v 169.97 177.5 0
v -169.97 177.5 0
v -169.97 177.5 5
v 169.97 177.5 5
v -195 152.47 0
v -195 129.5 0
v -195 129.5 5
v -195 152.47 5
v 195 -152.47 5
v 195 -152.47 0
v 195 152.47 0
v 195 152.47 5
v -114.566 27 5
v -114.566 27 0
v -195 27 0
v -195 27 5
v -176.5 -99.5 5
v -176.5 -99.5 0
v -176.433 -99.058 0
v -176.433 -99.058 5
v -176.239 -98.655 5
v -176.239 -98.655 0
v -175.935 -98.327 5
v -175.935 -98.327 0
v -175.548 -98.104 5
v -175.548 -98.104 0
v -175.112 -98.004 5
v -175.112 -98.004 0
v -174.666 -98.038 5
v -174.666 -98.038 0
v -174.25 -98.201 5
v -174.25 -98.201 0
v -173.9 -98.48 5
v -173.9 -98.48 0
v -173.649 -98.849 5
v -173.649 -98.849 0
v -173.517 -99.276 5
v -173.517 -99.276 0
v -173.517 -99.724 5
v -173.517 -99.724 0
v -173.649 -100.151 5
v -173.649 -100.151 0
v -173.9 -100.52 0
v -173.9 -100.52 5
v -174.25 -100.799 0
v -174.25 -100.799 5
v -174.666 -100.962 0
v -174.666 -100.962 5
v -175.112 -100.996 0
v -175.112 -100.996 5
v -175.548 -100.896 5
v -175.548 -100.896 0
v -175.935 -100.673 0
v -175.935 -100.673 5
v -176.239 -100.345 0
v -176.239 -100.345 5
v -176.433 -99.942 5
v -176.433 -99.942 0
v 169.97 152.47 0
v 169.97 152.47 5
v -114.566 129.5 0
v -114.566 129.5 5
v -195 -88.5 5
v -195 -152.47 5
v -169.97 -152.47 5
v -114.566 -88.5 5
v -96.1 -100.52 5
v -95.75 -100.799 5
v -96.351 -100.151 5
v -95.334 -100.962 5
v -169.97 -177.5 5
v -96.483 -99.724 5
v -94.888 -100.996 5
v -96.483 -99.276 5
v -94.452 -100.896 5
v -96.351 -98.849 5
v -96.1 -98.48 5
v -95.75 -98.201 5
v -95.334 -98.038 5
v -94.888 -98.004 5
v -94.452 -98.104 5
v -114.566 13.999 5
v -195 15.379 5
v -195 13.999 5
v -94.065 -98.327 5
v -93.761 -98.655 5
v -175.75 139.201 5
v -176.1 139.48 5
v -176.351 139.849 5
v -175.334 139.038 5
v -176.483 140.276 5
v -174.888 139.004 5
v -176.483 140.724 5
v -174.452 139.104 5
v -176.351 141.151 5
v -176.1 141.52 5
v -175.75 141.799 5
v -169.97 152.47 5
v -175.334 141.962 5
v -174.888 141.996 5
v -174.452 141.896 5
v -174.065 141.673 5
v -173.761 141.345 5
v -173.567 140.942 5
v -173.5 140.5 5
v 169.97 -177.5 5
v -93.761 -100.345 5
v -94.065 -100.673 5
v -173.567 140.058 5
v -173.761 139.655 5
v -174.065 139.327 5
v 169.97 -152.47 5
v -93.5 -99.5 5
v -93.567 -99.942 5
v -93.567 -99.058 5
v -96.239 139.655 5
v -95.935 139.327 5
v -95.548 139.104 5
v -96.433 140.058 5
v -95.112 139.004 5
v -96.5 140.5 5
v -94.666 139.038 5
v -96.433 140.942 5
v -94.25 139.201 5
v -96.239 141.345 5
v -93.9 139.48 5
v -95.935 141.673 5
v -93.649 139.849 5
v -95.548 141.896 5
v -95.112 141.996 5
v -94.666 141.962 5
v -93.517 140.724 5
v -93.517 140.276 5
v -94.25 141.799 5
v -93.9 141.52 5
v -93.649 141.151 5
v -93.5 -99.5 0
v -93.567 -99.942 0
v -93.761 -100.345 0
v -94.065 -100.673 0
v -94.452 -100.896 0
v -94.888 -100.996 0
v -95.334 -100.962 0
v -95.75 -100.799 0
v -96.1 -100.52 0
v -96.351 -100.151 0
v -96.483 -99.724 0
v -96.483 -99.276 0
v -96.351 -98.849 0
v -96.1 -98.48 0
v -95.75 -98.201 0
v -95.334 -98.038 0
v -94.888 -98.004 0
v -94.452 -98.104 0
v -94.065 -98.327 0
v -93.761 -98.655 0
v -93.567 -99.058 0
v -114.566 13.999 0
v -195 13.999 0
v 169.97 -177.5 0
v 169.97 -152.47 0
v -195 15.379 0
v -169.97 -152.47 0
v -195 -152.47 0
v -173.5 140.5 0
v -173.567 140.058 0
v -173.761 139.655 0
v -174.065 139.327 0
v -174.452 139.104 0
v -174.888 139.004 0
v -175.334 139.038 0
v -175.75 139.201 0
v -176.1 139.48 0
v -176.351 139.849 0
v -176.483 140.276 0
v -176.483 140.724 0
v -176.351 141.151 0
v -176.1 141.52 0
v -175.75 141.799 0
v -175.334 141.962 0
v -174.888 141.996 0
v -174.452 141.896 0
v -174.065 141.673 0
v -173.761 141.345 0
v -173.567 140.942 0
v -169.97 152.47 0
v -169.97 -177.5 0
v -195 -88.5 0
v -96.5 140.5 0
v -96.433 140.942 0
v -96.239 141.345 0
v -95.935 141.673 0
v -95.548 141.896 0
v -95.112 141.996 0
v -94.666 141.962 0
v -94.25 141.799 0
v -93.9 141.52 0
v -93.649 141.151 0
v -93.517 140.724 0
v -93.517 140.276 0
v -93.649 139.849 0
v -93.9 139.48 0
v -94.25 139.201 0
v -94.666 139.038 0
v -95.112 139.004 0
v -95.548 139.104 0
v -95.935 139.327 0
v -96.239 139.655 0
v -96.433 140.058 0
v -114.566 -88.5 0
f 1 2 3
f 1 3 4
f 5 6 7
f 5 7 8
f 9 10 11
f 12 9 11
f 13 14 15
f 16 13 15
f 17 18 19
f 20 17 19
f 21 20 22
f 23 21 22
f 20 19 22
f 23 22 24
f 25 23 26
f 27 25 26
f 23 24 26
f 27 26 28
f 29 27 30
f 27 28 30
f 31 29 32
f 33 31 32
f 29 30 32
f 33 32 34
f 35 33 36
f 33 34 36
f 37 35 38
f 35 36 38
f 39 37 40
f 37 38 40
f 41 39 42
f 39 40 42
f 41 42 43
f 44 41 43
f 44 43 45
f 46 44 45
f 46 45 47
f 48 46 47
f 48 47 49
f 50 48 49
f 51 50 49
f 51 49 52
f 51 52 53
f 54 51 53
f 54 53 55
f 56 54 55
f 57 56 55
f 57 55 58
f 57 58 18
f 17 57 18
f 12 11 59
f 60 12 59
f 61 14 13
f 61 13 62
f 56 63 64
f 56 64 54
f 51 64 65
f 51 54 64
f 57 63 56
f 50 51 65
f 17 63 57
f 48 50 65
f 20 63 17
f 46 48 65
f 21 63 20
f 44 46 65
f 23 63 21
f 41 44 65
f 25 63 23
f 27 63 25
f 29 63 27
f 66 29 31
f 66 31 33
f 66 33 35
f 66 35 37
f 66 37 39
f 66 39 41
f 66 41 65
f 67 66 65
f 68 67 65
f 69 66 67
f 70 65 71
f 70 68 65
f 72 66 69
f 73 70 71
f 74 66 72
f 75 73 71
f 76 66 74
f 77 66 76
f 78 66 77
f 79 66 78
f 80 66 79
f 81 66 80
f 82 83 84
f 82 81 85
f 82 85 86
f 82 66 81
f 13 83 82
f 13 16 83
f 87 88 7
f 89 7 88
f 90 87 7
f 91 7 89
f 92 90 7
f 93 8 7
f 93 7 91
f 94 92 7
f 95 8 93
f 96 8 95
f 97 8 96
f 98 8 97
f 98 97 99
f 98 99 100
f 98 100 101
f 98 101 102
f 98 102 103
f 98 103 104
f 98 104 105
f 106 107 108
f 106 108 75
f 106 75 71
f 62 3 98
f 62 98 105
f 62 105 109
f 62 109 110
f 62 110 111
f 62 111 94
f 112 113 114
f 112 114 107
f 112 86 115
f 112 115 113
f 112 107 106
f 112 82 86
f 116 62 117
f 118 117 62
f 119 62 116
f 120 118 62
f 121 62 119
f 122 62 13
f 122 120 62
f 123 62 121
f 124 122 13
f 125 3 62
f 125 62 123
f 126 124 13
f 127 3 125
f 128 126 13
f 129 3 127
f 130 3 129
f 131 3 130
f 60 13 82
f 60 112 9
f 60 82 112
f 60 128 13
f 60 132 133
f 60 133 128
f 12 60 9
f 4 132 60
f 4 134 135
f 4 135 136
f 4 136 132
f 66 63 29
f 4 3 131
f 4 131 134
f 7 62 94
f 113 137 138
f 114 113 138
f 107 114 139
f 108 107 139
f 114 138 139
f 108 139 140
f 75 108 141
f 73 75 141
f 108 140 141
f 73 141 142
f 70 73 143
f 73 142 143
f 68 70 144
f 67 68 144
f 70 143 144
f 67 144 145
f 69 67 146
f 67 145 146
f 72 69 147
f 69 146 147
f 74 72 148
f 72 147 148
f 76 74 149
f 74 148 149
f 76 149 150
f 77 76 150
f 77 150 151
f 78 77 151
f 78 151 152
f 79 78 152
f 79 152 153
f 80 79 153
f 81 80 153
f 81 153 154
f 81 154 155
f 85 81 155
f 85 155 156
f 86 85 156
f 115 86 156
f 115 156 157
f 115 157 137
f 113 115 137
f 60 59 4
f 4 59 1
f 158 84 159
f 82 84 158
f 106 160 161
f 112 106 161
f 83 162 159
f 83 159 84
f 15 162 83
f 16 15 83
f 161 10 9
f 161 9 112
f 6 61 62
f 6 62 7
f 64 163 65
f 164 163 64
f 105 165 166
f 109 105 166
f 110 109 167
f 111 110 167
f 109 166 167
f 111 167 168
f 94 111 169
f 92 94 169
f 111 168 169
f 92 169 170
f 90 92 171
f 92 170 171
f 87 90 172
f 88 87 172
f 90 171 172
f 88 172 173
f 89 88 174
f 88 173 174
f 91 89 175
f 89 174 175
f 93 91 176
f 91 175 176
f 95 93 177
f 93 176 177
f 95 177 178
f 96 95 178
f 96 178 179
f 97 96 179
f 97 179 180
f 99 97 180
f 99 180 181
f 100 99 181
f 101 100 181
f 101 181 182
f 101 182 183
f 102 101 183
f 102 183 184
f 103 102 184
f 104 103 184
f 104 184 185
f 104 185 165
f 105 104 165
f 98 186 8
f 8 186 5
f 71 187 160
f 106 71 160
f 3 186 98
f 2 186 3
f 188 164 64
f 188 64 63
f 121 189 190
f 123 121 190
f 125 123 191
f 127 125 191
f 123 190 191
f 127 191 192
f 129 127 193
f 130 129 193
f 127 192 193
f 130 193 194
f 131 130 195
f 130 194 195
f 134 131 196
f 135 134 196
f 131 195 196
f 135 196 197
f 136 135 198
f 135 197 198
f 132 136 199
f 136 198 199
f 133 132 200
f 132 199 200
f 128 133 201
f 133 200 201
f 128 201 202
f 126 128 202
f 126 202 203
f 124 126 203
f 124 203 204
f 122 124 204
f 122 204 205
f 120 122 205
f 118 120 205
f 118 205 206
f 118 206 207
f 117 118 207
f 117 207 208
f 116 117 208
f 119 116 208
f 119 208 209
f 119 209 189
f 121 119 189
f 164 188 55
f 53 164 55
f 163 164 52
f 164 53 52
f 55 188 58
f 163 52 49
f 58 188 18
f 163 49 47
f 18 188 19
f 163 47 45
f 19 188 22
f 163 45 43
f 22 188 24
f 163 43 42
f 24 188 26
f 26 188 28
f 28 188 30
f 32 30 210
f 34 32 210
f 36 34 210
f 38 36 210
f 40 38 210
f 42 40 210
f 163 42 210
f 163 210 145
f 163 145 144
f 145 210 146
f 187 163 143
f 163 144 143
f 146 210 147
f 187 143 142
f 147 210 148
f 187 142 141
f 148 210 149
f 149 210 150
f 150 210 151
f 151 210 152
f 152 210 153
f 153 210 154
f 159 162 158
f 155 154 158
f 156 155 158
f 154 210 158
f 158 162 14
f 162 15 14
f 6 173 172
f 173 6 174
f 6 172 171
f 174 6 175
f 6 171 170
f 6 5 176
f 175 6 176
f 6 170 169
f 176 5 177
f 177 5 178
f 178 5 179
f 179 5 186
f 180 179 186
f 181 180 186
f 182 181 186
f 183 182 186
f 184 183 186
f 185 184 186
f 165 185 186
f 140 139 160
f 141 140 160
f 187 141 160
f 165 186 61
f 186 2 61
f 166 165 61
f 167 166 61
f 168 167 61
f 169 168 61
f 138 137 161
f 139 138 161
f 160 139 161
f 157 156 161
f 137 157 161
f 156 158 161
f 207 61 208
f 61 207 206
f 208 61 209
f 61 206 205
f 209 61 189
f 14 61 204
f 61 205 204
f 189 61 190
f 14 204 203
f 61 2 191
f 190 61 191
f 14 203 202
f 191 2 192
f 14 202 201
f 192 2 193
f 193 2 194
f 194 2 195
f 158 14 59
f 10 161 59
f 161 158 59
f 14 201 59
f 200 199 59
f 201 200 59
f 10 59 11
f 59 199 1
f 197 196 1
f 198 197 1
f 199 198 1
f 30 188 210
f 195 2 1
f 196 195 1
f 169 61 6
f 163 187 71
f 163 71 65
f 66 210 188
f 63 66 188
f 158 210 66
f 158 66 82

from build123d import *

# Parameters (mm, degrees)
ESQUISSE1_W             = 390
ESQUISSE1_H             = 355
BOSS_EXTRU_1_DEPTH      = 5
ESQUISSE3_W             = 80.434472185
ESQUISSE3_H             = 102.5
ESQUISSE3_H_2           = 103.87880101
ESQUISSE3_W_2           = 25.03
ESQUISSE3_H_3           = 25.03
ENL_V_MAT_EXTRU_1_DEPTH = 10
ESQUISSE4_W             = 80.434472185
ESQUISSE4_H             = 5
BOSS_EXTRU_2_DEPTH      = 1.38
ESQUISSE9_R             = 1.5
ENL_V_MAT_EXTRU_2_DEPTH = 264.735189158


with BuildPart() as part:
    # Esquisse1 → Boss.-Extru.1 (new body)
    with BuildSketch(Plane.XY):
        Rectangle(ESQUISSE1_W, ESQUISSE1_H)
    extrude(amount=BOSS_EXTRU_1_DEPTH)

    # Esquisse3 → Enlèv. mat.-Extru.1 (cut)
    with BuildSketch(Plane(origin=(0, 0, 0), x_dir=(-1, 0, 0), z_dir=(0, 0, -1))):
        with Locations((154.782763907, 78.25)):
            Rectangle(ESQUISSE3_W, ESQUISSE3_H)
        with Locations((154.782763907, -36.560599495)):
            Rectangle(ESQUISSE3_W, ESQUISSE3_H_2)
        with Locations((-182.485, 164.985)):
            Rectangle(ESQUISSE3_W_2, ESQUISSE3_H_3)
        with Locations((182.485, 164.985)):
            Rectangle(ESQUISSE3_W_2, ESQUISSE3_H_3)
        with Locations((182.485, -164.985)):
            Rectangle(ESQUISSE3_W_2, ESQUISSE3_H_3)
        with Locations((-182.485, -164.985)):
            Rectangle(ESQUISSE3_W_2, ESQUISSE3_H_3)
    extrude(amount=-ENL_V_MAT_EXTRU_1_DEPTH, mode=Mode.SUBTRACT)

    # Esquisse4 → Boss.-Extru.2 (add)
    with BuildSketch(Plane.XZ.offset(-15.37880101)):
        with Locations((-154.782763907, 2.5)):
            Rectangle(ESQUISSE4_W, ESQUISSE4_H)
    extrude(amount=BOSS_EXTRU_2_DEPTH)

    # Esquisse9 → Enlèv. mat.-Extru.2 (cut, through all)
    with BuildSketch(Plane(origin=(0, 0, 0), x_dir=(-1, 0, 0), z_dir=(0, 0, -1))):
        with Locations((175, -99.5)):
            Circle(ESQUISSE9_R)
        with Locations(Location((95, -99.5, 0), (0, 0, 180))):
            Circle(ESQUISSE9_R)
        with Locations((95, 140.5)):
            Circle(ESQUISSE9_R)
        with Locations(Location((175, 140.5, 0), (0, 0, 180))):
            Circle(ESQUISSE9_R)
    extrude(amount=-ENL_V_MAT_EXTRU_2_DEPTH, mode=Mode.SUBTRACT)


solid = part.part
